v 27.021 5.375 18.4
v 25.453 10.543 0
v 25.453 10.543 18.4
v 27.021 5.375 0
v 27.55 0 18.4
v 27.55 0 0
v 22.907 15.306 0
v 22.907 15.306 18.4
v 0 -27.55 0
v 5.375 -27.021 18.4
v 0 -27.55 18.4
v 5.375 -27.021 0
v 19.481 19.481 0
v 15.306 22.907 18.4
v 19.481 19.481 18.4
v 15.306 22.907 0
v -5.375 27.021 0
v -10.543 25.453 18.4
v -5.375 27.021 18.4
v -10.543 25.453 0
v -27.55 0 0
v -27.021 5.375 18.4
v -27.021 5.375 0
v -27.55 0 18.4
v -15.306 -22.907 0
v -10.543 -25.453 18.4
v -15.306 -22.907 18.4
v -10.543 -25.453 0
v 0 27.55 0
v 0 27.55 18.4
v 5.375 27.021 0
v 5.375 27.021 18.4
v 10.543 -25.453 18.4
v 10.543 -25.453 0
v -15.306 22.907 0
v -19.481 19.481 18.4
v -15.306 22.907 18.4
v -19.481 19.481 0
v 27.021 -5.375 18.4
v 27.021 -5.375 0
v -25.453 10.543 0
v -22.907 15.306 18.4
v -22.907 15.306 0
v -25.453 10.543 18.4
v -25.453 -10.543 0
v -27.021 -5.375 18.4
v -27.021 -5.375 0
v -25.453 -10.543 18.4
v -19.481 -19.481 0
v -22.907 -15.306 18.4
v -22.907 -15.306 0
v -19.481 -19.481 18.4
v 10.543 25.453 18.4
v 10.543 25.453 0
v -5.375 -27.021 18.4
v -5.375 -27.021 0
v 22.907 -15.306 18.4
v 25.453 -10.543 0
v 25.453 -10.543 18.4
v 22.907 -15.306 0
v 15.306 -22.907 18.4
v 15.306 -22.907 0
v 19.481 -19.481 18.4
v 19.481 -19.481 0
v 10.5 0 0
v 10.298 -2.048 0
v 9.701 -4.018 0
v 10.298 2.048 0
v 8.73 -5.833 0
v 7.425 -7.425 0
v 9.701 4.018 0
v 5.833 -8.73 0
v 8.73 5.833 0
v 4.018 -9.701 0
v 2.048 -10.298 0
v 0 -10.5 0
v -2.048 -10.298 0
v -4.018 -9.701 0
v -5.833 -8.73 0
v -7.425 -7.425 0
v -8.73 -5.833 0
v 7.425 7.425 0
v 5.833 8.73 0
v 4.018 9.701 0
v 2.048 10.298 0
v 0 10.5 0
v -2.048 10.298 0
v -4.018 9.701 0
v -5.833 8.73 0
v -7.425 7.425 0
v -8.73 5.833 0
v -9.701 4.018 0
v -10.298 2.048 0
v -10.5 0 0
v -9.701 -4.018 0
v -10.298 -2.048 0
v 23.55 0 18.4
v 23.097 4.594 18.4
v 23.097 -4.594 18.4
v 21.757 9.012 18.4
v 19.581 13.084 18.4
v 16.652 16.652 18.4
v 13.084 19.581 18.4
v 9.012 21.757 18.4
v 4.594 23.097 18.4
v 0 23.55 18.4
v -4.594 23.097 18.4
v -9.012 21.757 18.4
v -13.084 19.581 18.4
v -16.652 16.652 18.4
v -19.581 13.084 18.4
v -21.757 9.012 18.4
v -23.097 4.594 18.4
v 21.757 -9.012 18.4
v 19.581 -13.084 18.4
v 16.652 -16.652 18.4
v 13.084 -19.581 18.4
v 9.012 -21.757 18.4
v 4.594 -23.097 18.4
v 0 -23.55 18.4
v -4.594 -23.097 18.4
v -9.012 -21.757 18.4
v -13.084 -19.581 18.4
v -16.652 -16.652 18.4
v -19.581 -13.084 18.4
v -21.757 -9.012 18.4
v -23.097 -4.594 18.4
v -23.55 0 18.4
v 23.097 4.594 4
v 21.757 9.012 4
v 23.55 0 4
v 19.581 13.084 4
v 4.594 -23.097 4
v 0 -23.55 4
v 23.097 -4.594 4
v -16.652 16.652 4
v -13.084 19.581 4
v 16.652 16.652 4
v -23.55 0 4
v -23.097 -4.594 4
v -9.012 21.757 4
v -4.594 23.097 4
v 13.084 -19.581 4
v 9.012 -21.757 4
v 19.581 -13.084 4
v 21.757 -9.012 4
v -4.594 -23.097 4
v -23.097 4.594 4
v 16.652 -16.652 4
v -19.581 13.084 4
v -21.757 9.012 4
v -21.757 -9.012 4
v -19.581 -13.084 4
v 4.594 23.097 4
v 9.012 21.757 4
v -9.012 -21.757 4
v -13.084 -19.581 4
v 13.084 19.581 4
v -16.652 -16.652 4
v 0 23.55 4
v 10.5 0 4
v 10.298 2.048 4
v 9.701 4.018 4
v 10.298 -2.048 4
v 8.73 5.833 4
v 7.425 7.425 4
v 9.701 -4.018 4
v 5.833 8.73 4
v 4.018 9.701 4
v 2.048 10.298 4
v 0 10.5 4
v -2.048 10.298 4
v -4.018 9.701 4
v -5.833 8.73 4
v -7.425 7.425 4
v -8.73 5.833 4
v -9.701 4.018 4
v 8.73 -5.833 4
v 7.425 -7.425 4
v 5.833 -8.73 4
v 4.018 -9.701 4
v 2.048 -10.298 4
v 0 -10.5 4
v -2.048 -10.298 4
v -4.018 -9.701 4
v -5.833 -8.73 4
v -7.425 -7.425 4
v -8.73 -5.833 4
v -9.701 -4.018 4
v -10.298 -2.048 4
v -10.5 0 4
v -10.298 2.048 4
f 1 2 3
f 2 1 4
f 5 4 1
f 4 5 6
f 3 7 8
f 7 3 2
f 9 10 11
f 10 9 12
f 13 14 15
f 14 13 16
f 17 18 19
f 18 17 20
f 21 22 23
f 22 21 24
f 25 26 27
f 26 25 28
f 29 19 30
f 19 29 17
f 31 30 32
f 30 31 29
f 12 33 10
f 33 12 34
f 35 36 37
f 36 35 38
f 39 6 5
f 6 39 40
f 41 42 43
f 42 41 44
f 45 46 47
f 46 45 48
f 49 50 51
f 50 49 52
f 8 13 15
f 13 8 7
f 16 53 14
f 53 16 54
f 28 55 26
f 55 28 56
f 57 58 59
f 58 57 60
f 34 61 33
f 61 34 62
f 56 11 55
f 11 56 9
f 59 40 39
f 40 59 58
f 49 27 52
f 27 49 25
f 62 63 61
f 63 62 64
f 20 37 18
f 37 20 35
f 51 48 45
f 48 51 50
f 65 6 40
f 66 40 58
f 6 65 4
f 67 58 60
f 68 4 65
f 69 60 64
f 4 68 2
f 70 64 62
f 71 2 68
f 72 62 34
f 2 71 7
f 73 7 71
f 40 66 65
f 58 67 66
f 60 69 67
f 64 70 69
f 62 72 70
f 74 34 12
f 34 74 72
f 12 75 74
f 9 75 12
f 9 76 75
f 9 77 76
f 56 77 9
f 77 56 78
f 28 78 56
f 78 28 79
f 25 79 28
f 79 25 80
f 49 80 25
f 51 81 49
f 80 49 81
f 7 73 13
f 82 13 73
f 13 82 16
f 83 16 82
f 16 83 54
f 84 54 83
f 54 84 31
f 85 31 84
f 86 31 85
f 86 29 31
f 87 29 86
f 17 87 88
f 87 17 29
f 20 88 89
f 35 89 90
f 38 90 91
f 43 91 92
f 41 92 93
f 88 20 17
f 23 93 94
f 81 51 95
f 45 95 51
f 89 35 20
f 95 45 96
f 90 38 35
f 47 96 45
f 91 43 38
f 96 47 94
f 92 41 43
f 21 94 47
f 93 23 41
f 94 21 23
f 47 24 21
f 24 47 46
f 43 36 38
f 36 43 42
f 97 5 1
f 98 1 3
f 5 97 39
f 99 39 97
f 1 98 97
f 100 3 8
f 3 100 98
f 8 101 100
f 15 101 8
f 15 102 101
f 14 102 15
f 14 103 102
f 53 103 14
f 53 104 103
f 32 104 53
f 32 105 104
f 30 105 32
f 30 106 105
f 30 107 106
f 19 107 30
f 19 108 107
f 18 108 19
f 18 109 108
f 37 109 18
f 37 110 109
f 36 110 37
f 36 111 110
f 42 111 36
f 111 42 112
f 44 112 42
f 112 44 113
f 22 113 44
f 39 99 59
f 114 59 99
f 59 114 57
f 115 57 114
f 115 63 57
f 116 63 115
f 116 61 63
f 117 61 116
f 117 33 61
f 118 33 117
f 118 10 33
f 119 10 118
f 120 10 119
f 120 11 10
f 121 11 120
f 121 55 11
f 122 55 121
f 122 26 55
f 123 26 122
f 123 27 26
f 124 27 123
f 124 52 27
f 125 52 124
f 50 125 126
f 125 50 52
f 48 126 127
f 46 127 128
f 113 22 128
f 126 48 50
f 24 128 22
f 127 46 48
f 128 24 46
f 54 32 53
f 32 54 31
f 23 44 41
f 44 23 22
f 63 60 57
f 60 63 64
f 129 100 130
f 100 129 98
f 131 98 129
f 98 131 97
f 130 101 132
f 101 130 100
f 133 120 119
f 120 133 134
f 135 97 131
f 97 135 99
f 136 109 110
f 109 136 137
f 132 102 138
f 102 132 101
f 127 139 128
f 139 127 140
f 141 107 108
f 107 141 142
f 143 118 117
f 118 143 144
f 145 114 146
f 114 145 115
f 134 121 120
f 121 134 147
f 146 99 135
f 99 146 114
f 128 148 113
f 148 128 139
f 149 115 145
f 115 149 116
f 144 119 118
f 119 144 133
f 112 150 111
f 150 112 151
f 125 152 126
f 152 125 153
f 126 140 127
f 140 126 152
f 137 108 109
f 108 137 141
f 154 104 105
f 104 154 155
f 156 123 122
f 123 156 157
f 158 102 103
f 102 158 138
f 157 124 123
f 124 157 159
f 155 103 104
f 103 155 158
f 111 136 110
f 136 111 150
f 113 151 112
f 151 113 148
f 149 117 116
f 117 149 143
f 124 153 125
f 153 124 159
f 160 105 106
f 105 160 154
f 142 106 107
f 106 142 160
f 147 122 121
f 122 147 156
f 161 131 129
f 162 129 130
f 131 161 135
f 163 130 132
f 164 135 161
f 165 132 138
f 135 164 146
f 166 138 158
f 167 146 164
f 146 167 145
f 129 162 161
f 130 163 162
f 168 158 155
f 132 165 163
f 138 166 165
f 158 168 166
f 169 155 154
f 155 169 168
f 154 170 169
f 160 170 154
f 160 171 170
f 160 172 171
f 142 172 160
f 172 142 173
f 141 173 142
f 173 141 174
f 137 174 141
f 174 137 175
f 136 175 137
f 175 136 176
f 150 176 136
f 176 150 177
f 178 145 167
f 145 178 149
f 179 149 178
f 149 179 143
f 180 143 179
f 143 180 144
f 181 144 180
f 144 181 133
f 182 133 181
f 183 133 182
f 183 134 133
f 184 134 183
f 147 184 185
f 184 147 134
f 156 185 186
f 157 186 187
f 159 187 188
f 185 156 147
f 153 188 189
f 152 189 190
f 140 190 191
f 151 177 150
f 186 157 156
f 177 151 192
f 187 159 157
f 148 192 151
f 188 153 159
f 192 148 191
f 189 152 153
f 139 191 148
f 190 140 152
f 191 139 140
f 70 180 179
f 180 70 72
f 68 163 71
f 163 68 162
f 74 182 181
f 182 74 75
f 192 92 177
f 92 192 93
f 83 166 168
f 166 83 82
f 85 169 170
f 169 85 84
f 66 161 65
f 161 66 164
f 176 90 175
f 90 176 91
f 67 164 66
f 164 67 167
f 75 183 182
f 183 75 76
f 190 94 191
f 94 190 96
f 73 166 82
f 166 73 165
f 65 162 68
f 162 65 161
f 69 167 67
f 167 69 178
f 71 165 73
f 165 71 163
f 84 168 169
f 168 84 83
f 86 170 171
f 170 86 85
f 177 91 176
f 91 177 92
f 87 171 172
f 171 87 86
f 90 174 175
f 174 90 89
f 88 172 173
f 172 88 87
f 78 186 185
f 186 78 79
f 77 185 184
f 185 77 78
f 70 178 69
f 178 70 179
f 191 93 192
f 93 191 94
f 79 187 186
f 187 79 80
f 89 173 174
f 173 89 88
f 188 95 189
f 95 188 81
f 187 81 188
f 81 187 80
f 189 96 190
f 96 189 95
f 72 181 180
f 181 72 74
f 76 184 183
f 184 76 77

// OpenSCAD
$fn = 32;

// ----------------------------------------------------------------------
// Bearing housing: seat for 6204 (47 x 14 mm), 55.1 mm body
// ----------------------------------------------------------------------

// --- parameters (mm) ---
housing_d = 55.1;         // housing outside diameter
housing_h = 18.4;         // overall housing height
wall_t = 4;               // wall thickness
seat_d = 47.1;            // 6204 seat, 0.1 mm clearance
seat_h = 14.4;            // pocket depth
shoulder = 4;             // shoulder under the bearing
pass_d = 21;              // shaft passage

module body() {
  cylinder(h = housing_h, d = housing_d);
}

difference() {
  union() {
    body();
  }
  translate([0, 0, housing_h - seat_h]) cylinder(h = seat_h + 1, d = seat_d);
  translate([0, 0, -1]) cylinder(h = housing_h - seat_h + 1, d = pass_d);
}
